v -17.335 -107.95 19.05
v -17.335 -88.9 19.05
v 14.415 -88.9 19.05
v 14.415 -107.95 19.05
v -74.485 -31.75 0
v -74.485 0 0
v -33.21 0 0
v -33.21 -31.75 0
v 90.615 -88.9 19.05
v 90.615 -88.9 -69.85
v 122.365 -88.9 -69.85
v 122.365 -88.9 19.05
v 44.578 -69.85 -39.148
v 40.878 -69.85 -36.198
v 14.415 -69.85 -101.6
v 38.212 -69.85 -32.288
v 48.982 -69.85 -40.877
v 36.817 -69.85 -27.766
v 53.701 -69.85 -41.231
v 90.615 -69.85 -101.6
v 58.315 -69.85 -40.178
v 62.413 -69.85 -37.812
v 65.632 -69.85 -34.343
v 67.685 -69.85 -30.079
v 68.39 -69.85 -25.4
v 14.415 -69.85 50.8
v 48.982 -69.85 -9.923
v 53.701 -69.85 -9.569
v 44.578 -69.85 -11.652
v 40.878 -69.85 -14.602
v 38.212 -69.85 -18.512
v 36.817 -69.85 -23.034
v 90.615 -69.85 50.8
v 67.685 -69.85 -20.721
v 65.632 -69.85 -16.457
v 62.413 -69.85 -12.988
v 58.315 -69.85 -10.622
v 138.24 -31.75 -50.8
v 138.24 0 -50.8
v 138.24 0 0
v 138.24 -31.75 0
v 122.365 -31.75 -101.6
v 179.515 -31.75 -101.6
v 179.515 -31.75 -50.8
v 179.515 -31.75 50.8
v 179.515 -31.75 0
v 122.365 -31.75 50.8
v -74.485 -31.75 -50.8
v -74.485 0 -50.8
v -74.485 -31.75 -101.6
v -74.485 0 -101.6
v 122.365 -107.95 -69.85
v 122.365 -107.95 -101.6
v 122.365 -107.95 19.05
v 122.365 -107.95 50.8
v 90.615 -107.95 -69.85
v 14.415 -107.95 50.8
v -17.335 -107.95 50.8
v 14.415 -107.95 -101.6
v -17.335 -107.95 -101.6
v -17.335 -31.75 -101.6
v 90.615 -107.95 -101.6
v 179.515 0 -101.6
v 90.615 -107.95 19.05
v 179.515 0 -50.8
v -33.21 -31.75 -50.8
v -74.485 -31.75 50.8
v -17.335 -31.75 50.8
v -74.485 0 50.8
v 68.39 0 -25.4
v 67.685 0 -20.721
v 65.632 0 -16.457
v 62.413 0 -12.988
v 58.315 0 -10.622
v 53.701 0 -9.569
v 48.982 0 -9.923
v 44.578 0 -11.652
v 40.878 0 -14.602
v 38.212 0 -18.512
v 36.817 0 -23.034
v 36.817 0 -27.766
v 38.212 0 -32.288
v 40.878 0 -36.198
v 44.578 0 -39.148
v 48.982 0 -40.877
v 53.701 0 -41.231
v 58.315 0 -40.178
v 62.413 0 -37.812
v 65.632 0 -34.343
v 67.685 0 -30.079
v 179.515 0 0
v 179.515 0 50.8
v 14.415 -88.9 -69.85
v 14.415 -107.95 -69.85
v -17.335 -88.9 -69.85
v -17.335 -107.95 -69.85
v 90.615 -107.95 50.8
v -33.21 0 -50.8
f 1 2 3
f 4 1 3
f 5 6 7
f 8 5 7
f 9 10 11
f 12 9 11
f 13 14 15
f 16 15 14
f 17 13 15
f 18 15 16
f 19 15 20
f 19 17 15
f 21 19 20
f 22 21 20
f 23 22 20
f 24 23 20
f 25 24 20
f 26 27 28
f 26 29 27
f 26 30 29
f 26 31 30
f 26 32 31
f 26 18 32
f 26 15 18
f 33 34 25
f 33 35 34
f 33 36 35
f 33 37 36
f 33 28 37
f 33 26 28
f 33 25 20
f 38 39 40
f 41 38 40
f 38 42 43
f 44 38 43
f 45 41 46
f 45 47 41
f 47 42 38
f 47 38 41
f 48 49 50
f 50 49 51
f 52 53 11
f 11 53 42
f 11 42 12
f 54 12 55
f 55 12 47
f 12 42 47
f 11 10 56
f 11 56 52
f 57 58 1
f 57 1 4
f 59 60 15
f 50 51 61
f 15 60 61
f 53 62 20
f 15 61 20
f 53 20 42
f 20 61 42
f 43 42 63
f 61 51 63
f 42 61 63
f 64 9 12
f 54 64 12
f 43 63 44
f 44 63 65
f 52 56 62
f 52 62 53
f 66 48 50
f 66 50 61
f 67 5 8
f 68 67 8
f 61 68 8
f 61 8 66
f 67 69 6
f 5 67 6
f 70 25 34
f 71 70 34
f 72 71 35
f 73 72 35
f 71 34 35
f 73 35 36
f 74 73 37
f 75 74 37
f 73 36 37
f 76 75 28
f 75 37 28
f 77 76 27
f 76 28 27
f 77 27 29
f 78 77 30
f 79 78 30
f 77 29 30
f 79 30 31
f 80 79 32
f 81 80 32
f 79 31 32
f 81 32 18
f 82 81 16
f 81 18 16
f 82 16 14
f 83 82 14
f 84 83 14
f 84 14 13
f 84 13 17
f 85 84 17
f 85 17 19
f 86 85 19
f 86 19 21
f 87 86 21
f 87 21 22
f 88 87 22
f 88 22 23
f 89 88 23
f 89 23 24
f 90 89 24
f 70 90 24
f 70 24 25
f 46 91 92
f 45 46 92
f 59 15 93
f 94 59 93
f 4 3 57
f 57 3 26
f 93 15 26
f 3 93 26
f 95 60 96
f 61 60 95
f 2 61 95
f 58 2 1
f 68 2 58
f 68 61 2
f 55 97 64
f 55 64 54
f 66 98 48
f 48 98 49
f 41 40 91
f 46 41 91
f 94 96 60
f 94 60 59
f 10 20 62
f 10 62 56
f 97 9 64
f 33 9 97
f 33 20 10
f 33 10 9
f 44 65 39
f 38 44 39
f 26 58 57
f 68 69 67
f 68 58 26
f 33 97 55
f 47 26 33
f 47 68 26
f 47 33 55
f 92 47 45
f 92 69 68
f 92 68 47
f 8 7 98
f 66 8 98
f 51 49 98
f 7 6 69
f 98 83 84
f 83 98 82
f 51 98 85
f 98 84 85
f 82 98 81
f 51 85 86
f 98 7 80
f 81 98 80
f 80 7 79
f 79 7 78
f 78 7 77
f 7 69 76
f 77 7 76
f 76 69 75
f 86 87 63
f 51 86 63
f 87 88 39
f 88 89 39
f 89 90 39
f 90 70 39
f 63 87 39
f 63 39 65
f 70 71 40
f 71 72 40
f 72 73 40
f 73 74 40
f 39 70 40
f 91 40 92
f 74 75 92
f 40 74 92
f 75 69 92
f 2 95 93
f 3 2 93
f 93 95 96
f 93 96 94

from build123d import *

# Parameters (mm, degrees)
F1_DEPTH  = 31.75
F2_W      = 139.7
F2_H      = 152.4
F3_DEPTH  = 38.1
F4_W      = 31.75
F4_H      = 152.4
F5_DEPTH  = 19.05
F4_R      = 15.875
F6_DEPTH  = 69.851
F7_W      = 31.75
F7_H      = 31.75
F8_DEPTH  = 19.05
F9_W      = 31.75
F9_H      = 31.75
F10_DEPTH = 19.05


with BuildPart() as f1:
    # F0 (on Front) → F1 (new body)
    with BuildSketch(Plane.XZ):
        Polygon((179.5150149531, 50.8), (-74.4849850469, 50.8), (-74.4849850469, 0), (-33.2099850469, 0), (-33.2099850469, -50.8), (-74.4849850469, -50.8), (-74.4849850469, -101.6), (179.5150149531, -101.6), (179.5150149531, -50.8), (138.2400149531, -50.8), (138.2400149531, 0), (179.5150149531, 0), align=None)
    extrude(amount=F1_DEPTH)

    # F2 (on face) → F3 (join)
    with BuildSketch(Plane.XZ.offset(31.75)):
        with Locations((52.5150149531, -25.4)):
            Rectangle(F2_W, F2_H)
    extrude(amount=F3_DEPTH)

    # F4 (on face) → F5 (join)
    with BuildSketch(Plane.XZ.offset(69.85)):
        with Locations((-1.4599850469, -25.4)):
            Rectangle(F4_W, F4_H)
        with Locations((106.4900149531, -25.4)):
            Rectangle(F4_W, F4_H)
    extrude(amount=F5_DEPTH)

    # F4 (on face) → F6 (cut, through all)
    with BuildSketch(Plane.XZ.offset(69.85)):
        with Locations((52.5150149531, -25.4)):
            Circle(F4_R)
    extrude(amount=-F6_DEPTH, mode=Mode.SUBTRACT)

    # F7 (on face) → F8 (join)
    with BuildSketch(Plane.XZ.offset(88.9)):
        with Locations((-1.4599850469, 34.925)):
            Rectangle(F7_W, F7_H)
        with Locations((-1.4599850469, -85.725)):
            Rectangle(F7_W, F7_H)
    extrude(amount=F8_DEPTH)

    # F9 (on face) → F10 (join)
    with BuildSketch(Plane.XZ.offset(88.9)):
        with Locations((106.4900149531, 34.925)):
            Rectangle(F9_W, F9_H)
        with Locations((106.4900149531, -85.725)):
            Rectangle(F9_W, F9_H)
    extrude(amount=F10_DEPTH)


solid = f1.part
